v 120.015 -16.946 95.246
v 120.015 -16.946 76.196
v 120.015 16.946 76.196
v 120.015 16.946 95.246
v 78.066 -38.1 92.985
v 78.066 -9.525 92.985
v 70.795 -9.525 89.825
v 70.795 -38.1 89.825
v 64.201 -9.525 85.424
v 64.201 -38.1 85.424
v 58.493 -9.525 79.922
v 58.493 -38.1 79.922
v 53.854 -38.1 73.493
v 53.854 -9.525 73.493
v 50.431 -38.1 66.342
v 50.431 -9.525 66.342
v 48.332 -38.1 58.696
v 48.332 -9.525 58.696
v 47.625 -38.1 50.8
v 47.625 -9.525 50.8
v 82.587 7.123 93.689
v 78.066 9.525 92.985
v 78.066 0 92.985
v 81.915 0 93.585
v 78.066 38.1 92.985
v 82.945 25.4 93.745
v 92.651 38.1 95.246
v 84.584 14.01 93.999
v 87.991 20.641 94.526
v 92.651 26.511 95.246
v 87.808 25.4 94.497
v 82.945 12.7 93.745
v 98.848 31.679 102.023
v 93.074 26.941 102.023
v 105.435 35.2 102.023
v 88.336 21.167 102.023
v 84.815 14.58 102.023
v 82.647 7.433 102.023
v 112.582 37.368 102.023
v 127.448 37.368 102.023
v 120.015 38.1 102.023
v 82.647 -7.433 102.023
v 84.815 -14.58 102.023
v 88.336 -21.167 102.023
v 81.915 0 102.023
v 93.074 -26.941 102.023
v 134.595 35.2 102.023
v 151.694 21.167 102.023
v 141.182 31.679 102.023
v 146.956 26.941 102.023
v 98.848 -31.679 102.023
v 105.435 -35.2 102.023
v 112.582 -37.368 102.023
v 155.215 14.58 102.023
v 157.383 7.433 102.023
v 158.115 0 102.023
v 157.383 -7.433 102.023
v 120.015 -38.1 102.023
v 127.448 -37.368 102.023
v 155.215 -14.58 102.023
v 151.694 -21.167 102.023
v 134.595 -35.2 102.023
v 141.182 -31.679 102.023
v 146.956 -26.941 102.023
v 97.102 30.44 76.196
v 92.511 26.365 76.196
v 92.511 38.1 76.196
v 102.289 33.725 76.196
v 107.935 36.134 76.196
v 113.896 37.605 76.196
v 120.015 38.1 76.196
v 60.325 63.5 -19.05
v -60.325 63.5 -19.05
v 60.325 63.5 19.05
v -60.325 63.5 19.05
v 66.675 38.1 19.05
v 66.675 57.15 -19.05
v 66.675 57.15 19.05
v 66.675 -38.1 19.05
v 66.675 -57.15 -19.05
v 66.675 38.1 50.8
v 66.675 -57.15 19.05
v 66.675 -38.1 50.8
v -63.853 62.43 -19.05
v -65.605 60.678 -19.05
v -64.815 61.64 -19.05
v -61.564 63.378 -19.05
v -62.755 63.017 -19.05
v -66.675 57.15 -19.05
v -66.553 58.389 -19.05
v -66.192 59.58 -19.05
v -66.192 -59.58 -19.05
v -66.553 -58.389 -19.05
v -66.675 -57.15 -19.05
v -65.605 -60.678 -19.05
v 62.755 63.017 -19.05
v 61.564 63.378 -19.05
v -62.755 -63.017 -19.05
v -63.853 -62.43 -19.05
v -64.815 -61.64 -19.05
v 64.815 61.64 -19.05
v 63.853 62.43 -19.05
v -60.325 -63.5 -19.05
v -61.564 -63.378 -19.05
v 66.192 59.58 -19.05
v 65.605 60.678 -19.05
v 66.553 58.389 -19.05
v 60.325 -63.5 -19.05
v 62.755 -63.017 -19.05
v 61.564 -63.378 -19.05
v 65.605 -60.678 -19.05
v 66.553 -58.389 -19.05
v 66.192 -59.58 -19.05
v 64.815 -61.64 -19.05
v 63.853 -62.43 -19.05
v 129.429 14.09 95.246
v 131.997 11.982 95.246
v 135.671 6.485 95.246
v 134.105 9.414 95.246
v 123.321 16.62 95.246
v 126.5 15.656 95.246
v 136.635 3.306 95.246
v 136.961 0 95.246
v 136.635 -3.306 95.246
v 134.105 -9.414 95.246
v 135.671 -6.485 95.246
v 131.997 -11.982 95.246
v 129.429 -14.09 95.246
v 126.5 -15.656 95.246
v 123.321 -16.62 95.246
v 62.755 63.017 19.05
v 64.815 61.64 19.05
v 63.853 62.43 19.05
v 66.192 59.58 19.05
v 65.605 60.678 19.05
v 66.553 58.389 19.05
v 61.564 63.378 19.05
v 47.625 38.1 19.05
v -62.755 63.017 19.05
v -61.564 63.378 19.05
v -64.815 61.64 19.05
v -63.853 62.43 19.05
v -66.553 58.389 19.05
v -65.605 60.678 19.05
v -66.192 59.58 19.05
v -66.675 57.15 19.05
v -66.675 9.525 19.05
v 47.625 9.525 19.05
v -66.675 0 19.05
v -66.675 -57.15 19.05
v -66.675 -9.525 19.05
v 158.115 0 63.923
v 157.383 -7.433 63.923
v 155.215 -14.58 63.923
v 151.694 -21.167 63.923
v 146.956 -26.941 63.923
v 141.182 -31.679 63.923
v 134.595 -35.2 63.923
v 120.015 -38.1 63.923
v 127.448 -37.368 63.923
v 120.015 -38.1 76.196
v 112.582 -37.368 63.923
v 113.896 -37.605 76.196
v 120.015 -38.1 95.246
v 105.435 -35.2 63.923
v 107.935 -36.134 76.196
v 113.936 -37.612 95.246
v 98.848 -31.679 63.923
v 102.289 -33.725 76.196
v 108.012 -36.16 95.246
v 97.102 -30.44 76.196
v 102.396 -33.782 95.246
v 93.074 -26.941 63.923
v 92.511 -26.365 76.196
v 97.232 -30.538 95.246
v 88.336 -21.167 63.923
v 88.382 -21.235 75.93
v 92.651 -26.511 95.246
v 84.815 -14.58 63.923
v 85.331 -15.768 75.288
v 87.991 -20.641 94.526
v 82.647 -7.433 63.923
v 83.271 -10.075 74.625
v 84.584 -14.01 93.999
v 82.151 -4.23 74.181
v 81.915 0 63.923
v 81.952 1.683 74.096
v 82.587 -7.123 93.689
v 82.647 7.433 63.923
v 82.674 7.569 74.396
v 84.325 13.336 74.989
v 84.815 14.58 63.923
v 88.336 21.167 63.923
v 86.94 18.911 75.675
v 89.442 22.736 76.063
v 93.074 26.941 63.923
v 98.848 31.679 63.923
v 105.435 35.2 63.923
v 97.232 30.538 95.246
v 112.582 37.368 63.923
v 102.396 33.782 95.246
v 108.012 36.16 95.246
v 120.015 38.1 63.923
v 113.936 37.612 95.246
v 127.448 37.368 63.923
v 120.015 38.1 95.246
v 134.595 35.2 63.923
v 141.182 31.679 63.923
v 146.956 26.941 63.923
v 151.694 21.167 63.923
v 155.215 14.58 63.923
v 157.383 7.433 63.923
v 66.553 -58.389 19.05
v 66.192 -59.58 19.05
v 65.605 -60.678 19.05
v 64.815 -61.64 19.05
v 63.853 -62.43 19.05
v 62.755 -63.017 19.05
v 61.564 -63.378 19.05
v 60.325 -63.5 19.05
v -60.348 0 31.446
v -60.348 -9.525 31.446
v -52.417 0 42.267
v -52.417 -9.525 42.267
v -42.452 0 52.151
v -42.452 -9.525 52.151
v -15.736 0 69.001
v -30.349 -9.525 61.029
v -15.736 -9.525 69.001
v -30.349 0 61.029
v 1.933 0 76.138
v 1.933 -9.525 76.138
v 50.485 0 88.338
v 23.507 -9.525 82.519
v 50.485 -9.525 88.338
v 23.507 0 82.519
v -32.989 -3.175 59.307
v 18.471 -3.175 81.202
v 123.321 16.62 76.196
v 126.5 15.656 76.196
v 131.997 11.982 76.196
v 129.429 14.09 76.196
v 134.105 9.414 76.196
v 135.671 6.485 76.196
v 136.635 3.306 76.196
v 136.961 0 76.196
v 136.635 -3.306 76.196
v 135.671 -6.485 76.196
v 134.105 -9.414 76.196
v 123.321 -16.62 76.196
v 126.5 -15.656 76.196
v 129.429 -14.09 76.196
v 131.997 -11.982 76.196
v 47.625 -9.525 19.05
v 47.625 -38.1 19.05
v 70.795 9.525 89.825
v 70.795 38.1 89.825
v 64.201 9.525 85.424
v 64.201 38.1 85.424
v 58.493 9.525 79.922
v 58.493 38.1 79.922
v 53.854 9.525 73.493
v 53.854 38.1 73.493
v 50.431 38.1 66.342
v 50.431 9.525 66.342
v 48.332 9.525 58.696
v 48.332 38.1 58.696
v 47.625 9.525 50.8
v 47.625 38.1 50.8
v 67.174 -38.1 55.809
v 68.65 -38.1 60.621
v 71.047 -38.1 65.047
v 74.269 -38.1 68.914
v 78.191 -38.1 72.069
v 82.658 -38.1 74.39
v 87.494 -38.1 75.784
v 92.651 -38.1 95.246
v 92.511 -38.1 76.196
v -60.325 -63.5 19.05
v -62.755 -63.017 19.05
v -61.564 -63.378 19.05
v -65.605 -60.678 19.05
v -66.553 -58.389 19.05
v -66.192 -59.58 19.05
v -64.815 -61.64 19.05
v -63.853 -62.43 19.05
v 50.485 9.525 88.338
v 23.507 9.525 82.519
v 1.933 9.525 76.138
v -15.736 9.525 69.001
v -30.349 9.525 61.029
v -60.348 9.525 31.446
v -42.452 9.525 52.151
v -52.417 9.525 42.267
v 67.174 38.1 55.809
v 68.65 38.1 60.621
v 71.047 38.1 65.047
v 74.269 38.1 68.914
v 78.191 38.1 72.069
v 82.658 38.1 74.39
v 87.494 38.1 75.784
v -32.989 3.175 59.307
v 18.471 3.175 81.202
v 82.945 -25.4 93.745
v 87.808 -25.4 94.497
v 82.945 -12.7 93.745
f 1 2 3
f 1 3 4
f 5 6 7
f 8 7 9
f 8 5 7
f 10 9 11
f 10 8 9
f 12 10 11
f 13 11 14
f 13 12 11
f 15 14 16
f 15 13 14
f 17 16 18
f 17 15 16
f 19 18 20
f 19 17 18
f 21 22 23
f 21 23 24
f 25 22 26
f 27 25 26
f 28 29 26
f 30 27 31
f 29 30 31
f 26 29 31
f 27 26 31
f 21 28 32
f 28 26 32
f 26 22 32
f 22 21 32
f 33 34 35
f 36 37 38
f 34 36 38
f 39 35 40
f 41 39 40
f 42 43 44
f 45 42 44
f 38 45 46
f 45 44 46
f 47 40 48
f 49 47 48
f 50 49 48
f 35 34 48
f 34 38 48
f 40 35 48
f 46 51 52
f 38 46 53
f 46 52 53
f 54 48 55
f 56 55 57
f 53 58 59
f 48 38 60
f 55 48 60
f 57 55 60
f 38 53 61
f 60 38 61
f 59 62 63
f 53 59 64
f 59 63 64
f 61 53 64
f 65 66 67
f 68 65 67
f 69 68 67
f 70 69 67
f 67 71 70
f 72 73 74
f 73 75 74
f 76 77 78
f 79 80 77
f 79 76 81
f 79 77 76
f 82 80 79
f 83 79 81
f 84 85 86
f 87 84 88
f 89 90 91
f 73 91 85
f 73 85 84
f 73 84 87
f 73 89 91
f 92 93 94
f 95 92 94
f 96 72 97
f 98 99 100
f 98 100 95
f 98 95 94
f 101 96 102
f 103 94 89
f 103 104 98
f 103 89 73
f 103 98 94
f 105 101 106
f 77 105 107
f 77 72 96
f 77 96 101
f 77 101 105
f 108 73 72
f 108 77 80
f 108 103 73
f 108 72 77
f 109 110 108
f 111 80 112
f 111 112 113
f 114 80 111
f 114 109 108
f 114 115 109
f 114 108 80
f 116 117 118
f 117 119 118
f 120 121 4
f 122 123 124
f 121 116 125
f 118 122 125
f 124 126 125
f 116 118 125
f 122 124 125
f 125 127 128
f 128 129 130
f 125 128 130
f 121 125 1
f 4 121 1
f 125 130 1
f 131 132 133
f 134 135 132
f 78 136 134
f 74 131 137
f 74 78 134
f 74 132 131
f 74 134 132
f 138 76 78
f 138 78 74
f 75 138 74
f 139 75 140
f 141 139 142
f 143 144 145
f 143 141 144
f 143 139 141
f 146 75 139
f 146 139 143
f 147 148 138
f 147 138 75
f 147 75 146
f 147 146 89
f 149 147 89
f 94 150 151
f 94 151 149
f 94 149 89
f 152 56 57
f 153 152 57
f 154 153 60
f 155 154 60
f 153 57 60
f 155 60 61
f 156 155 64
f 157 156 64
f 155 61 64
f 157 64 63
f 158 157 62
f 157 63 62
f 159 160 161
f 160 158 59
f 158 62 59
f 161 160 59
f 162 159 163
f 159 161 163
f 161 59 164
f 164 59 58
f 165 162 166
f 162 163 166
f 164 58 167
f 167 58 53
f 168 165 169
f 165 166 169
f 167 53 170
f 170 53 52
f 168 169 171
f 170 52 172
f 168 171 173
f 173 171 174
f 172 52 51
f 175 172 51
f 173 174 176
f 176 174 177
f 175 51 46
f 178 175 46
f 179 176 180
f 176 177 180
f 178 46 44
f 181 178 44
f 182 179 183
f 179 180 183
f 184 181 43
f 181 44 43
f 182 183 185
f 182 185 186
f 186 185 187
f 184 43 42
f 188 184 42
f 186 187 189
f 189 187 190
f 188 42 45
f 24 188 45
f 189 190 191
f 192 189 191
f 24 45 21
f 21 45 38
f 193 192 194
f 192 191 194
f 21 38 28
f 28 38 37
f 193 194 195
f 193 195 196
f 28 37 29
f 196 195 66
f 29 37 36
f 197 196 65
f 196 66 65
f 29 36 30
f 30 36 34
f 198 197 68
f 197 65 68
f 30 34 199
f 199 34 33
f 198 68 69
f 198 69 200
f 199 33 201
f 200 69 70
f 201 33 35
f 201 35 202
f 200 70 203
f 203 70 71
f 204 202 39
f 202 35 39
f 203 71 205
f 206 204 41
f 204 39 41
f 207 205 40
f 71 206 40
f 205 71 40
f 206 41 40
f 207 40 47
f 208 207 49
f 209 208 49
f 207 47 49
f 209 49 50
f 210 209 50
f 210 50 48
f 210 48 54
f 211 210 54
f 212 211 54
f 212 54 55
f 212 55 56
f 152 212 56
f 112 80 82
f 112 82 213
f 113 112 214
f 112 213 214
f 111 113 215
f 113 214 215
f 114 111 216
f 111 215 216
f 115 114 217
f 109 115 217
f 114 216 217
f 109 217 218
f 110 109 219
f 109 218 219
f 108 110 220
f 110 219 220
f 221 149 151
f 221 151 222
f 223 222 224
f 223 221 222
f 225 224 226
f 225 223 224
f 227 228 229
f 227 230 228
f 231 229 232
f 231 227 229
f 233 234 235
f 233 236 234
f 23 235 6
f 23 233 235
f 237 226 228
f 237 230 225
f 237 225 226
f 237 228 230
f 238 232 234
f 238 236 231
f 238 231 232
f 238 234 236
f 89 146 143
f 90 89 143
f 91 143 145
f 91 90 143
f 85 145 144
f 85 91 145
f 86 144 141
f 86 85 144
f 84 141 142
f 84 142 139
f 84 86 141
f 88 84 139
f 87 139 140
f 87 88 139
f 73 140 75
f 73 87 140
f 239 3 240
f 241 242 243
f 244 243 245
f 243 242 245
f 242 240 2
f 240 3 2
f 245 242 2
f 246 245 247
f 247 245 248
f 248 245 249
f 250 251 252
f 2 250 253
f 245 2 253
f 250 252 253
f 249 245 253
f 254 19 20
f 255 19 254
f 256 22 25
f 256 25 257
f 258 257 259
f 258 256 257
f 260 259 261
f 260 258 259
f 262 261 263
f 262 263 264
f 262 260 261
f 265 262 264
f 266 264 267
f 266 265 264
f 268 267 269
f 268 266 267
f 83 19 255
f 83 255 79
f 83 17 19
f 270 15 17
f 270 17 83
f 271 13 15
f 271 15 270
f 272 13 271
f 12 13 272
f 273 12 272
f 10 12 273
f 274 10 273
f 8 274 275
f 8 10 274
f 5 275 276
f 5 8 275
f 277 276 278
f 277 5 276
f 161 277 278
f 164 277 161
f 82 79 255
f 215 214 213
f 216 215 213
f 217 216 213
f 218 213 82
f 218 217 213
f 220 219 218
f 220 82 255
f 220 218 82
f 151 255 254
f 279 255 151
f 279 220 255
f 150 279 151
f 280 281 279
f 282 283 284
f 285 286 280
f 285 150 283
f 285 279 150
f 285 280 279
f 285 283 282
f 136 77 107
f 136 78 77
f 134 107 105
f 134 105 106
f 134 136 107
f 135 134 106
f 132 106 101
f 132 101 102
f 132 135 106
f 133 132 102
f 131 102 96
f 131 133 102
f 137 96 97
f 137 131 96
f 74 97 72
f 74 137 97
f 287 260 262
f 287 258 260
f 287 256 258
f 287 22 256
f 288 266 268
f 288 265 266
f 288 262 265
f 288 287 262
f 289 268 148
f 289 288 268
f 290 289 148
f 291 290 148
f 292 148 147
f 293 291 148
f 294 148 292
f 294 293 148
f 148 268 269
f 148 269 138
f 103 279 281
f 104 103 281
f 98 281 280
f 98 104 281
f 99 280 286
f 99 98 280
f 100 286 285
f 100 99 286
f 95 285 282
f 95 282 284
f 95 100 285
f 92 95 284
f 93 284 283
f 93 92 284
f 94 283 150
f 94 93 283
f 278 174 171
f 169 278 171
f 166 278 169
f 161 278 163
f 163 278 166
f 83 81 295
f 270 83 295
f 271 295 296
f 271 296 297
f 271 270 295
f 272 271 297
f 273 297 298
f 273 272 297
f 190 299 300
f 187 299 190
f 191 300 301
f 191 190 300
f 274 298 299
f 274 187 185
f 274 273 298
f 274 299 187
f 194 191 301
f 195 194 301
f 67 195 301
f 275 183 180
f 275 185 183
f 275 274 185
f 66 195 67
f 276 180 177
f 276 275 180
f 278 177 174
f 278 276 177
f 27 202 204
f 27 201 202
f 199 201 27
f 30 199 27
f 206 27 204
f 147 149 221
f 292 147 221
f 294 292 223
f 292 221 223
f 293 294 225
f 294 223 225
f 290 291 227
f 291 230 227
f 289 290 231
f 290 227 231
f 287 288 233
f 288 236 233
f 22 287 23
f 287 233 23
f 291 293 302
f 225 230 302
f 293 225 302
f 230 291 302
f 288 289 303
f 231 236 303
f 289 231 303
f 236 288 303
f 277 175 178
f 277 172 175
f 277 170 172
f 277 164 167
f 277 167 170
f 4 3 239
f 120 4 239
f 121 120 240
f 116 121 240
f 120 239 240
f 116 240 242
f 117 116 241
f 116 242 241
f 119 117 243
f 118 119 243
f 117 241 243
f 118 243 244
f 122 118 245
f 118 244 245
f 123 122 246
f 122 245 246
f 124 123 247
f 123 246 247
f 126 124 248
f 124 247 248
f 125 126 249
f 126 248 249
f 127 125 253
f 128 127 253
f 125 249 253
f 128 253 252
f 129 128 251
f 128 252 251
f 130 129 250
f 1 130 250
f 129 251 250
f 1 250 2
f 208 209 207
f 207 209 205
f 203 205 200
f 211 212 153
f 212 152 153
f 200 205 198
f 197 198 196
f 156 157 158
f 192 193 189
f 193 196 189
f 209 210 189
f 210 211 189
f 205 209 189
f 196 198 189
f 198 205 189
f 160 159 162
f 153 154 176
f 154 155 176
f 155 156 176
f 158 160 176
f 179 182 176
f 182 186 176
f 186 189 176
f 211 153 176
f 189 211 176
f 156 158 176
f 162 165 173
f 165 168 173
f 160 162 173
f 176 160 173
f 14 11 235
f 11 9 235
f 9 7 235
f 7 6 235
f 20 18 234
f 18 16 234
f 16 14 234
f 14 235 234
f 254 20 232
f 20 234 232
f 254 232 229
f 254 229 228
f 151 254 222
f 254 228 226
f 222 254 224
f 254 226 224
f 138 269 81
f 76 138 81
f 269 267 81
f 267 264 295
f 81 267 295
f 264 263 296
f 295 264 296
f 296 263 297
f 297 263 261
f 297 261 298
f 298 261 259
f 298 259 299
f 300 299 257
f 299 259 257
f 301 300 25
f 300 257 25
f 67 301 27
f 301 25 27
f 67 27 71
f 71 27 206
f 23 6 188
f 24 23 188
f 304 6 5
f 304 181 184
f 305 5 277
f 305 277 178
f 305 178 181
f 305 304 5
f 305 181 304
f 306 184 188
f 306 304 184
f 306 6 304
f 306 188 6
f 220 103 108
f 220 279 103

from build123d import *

# Parameters (mm, degrees)
F1_DEPTH = 63.5
F2_DEPTH = 9.525
F3_DEPTH = 38.1
F5_R     = 6.35


with BuildPart() as f1:
    # F0 (on Front) → F1 (new body, symmetric)
    with BuildSketch(Plane.XZ):
        Polygon((47.625, 19.05), (-66.675, 19.05), (-66.675, -19.05), (66.675, -19.05), (66.675, 19.05), align=None)
    extrude(amount=F1_DEPTH, both=True)

    # F0 (on Front) → F2 (join, symmetric)
    with BuildSketch(Plane.XZ):
        with BuildLine():
            add(Edge.make_bspline(
                [(-66.675, 19.05), (-45.088604, 71.2366), (17.616627, 83.509553), (78.066317, 92.984823)],
                knots=[0, 0, 0, 0, 163.406627, 163.406627, 163.406627, 163.406627], degree=3))
            Line((-66.675, 19.05), (47.625, 19.05))
            Line((47.625, 19.05), (47.625, 50.8))
            ThreePointArc((47.625, 50.8), (56.029969, 76.810734), (78.066317, 92.984823))
        make_face()
    extrude(amount=F2_DEPTH, both=True)

    # F0 (on Front) → F3 (join, symmetric)
    with BuildSketch(Plane.XZ):
        with BuildLine():
            Line((47.625, 50.8), (47.625, 19.05))
            Line((47.625, 19.05), (66.675, 19.05))
            Line((66.675, 19.05), (66.675, 50.8))
            ThreePointArc((66.675, 50.8), (74.269175, 68.913879), (92.510638, 76.196264))
            Line((92.510638, 76.196264), (120.014986, 76.196264))
            Line((120.014986, 76.196264), (120.014986, 95.246264))
            Line((120.014986, 95.246264), (92.651304, 95.246264))
            add(Edge.make_bspline(
                [(78.066317, 92.984823), (82.950328, 93.750374), (87.819616, 94.497663), (92.651304, 95.246264)],
                knots=[163.406627, 163.406627, 163.406627, 163.406627, 176.609009, 176.609009, 176.609009, 176.609009], degree=3))
            ThreePointArc((78.066317, 92.984823), (56.029969, 76.810734), (47.625, 50.8))
        make_face()
    extrude(amount=F3_DEPTH, both=True)

    # F0 (on Front) → F4 (revolve)
    with BuildSketch(Plane.XZ):
        Polygon((120.014986, 102.023325), (120.014986, 95.246264), (136.960638, 95.246264), (136.960638, 76.196264), (120.014986, 76.196264), (120.014986, 63.923325), (158.114986, 63.923325), (158.114986, 102.023325), align=None)
    revolve(axis=Axis((120.014986, 0, 82.973325), (0, 0, -1)))

    # F5
    f5_edges = [f1.edges().sort_by_distance(p)[0] for p in [
        (-66.675, -63.5, 0),
        (66.675, -63.5, 0),
        (66.675, 63.5, 0),
        (-66.675, 63.5, 0),
    ]]
    fillet(f5_edges, radius=F5_R)


solid = f1.part
